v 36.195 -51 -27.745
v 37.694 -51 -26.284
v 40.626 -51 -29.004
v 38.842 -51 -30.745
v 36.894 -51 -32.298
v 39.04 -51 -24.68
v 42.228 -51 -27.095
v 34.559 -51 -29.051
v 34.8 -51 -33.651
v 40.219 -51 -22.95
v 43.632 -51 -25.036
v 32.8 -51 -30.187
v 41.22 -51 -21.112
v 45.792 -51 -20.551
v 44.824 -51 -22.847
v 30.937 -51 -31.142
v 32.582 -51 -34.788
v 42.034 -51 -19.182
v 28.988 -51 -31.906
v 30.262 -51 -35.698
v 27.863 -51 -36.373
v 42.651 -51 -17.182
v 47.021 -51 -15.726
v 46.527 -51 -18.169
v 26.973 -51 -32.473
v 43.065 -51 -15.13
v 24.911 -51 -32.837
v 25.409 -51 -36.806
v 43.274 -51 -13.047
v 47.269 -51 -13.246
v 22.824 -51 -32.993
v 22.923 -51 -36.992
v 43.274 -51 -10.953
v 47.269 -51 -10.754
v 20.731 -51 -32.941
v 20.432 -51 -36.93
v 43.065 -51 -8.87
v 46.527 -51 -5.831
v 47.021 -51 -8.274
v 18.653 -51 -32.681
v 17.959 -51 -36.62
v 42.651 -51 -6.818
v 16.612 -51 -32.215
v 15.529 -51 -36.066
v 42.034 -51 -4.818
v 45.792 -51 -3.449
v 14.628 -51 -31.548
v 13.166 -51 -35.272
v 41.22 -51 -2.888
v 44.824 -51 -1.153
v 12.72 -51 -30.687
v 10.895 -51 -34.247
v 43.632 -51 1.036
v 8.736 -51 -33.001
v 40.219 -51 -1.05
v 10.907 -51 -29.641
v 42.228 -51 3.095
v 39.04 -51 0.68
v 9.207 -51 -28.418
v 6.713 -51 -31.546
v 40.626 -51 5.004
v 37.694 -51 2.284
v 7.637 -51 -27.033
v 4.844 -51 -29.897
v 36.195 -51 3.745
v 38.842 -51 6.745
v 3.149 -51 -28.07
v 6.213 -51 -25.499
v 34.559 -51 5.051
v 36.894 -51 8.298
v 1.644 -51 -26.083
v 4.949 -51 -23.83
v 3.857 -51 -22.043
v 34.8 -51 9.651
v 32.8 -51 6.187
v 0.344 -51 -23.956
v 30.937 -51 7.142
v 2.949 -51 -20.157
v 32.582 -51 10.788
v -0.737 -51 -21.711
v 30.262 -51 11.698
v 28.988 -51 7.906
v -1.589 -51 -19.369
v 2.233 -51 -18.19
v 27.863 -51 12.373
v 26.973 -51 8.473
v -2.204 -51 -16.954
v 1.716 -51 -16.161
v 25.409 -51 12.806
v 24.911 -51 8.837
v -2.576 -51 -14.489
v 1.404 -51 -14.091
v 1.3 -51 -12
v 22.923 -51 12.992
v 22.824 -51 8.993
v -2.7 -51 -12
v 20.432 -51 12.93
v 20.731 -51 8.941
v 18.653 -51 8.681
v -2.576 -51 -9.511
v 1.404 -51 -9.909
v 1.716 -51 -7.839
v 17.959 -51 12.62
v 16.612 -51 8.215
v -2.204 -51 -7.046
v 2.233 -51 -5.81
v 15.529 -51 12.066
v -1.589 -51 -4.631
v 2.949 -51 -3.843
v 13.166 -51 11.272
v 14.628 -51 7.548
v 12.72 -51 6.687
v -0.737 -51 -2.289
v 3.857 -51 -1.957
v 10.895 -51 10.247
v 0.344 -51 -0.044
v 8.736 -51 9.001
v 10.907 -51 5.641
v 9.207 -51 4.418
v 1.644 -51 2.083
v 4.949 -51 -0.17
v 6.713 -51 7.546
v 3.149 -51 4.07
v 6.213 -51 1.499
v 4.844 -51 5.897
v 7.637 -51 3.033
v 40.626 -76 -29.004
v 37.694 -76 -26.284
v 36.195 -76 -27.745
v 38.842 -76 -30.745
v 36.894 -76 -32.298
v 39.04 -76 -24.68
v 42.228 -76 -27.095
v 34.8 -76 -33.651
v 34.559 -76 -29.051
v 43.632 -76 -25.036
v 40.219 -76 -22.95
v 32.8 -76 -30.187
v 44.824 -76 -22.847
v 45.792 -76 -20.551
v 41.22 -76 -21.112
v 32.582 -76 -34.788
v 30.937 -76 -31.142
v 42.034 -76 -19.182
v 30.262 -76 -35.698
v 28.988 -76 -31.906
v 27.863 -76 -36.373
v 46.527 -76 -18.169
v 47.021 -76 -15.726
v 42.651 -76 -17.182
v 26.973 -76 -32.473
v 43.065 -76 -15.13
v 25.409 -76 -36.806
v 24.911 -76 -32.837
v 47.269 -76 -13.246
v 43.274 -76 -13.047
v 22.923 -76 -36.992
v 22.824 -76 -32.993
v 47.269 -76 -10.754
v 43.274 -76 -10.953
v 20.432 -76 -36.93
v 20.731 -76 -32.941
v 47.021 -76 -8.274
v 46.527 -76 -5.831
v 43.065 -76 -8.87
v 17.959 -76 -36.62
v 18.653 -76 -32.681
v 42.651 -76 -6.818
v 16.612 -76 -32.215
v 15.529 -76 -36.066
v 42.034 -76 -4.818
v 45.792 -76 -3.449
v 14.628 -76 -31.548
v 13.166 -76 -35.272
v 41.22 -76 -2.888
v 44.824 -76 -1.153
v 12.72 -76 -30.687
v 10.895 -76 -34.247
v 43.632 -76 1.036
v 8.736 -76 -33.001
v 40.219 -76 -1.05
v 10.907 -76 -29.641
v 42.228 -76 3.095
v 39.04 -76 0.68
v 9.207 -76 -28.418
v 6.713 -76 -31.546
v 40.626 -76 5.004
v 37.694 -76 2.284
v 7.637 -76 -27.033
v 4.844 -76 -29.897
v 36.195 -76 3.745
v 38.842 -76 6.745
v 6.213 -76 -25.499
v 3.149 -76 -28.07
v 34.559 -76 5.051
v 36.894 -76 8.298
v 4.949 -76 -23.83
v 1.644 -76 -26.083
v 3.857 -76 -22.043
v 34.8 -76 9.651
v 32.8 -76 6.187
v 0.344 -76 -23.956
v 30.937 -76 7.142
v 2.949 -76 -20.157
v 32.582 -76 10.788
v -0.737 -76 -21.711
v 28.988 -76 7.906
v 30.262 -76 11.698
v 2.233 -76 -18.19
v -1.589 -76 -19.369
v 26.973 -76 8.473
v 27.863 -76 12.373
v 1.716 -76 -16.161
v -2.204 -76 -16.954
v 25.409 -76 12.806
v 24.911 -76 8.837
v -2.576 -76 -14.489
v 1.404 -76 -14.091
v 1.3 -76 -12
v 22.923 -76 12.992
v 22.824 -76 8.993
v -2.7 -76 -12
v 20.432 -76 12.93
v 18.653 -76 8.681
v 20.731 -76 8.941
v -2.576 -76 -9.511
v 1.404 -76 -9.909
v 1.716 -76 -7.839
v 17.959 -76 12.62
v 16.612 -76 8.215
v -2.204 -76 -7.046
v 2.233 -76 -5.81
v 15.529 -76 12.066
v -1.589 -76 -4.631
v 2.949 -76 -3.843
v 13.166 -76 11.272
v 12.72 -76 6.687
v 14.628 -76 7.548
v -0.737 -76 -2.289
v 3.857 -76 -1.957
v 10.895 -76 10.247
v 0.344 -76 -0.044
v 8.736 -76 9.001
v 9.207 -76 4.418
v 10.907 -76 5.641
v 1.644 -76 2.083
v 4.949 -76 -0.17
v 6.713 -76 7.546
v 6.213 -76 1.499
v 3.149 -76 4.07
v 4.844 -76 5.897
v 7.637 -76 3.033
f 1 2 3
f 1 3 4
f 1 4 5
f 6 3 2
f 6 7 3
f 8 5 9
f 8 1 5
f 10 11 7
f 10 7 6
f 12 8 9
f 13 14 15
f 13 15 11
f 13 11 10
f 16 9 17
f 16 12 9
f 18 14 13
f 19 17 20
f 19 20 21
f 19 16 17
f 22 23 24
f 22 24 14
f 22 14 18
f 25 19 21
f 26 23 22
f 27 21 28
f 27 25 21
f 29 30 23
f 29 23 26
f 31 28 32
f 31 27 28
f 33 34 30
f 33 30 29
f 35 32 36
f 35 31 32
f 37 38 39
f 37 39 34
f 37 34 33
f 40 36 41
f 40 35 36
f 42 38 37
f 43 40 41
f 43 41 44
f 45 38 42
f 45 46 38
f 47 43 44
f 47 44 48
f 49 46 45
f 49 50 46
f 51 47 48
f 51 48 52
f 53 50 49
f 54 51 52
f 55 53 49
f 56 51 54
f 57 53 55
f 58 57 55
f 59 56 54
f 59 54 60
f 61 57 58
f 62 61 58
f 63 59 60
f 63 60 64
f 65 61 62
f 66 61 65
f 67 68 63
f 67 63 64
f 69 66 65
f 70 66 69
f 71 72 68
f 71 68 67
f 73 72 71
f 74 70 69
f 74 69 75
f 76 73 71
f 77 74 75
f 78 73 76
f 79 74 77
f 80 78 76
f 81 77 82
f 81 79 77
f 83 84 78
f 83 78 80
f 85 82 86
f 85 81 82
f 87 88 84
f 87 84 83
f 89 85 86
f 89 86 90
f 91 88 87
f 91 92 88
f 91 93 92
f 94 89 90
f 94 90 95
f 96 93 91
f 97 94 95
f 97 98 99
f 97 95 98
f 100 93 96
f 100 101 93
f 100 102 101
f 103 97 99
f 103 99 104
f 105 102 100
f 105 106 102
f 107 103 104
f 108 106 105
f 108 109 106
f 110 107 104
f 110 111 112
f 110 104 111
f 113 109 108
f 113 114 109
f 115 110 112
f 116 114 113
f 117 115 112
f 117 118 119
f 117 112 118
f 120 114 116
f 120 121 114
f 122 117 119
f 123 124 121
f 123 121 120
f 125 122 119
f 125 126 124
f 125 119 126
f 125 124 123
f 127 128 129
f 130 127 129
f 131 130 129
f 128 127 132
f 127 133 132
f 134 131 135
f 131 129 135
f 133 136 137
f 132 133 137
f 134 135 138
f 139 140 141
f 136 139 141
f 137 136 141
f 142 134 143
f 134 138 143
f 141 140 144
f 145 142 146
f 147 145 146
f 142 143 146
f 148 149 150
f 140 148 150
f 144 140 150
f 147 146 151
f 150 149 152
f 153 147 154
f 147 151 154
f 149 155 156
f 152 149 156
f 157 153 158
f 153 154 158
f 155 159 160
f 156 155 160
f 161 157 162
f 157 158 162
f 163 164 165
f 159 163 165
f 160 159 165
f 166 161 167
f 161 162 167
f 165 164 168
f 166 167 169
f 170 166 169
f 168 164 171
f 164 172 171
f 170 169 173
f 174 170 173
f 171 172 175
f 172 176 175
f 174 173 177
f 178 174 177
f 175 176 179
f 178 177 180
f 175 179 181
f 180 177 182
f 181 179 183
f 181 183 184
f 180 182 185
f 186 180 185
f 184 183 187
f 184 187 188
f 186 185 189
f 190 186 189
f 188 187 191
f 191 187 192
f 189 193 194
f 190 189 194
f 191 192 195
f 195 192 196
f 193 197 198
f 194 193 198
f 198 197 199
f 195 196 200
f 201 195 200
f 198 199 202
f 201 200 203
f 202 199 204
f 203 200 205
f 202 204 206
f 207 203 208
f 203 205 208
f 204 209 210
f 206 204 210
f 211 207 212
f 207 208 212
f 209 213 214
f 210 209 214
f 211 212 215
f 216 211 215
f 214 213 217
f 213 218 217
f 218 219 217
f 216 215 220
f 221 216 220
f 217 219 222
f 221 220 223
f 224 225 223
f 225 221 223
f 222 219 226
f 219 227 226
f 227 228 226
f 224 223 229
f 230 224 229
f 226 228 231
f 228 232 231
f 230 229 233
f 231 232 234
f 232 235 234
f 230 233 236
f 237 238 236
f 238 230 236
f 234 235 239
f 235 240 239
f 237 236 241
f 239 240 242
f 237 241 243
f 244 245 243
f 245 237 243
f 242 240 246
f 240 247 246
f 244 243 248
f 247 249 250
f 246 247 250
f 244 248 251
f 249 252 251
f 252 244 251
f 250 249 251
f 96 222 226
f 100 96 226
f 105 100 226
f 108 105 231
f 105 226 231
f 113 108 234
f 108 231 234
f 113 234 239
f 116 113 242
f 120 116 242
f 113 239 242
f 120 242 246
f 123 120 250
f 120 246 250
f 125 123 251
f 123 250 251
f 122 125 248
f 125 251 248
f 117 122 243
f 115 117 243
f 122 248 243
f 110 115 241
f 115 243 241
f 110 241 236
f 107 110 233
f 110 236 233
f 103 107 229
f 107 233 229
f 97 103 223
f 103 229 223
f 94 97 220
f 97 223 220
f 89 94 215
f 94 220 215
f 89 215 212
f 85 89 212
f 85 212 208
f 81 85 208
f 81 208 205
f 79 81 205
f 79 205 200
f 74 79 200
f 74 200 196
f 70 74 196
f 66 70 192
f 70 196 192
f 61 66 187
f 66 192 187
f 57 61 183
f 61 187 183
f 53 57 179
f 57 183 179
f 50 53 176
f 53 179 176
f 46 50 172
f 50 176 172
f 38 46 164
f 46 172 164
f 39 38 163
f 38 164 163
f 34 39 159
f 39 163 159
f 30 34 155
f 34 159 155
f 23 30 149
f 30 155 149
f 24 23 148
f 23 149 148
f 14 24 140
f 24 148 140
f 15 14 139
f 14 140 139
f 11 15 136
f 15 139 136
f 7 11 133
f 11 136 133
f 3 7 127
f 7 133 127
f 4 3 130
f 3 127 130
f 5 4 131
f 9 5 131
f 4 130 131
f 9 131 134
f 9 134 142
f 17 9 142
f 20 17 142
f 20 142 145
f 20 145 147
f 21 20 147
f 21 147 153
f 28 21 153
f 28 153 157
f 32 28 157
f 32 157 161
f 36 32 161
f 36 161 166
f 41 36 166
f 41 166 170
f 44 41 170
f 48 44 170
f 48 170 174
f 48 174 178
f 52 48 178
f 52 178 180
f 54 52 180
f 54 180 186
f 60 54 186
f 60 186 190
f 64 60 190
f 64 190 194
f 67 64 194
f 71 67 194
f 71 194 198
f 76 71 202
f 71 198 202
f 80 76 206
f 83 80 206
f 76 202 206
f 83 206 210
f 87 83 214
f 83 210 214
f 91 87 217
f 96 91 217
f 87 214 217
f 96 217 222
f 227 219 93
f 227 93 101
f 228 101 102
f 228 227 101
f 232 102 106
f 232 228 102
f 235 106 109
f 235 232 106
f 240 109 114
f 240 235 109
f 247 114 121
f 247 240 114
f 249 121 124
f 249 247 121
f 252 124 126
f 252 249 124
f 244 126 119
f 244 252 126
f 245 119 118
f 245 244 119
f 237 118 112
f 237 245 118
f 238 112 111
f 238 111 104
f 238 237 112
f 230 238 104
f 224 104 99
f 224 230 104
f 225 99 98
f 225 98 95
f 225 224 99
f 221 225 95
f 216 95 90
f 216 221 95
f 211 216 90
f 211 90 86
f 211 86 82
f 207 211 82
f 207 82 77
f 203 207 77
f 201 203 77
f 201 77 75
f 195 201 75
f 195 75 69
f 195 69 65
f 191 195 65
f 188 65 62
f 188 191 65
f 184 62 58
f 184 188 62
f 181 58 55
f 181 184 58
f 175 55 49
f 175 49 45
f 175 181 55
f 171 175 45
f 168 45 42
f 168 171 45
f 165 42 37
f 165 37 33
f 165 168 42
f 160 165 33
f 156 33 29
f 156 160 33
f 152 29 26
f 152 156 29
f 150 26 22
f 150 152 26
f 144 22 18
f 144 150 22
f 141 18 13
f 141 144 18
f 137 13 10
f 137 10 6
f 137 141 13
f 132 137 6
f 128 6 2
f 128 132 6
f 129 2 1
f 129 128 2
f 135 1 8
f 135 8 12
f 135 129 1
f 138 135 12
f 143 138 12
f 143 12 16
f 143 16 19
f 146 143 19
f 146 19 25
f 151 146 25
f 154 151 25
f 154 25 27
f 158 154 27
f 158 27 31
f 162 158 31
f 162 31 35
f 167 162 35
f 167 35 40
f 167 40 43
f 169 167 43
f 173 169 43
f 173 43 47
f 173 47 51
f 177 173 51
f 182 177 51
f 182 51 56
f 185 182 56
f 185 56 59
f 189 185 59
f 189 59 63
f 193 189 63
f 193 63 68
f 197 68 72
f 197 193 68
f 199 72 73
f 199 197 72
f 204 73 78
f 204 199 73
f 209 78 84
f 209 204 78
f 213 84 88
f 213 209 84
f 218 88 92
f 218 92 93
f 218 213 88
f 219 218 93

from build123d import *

# Parameters (mm, degrees)
CYLINDER015_R          = 21
CYLINDER015_DEPTH      = 25
CYLINDER016_R          = 25
CYLINDER016_DEPTH      = 25
CUT004_ROLL_ANGLE      = 90
CUT004_PITCH_ANGLE     = -7e-06
CUT004_PLACEMENT_ANGLE = -179.999993


with BuildPart() as cylinder015:
    # Cylinder015 → Cylinder015 (new body)
    with BuildSketch(Plane.XY):
        Circle(CYLINDER015_R)
    extrude(amount=CYLINDER015_DEPTH)


with BuildPart() as cut004:
    # Cylinder016 → Cylinder016 (new body)
    with BuildSketch(Plane.XY):
        Circle(CYLINDER016_R)
    extrude(amount=CYLINDER016_DEPTH)

    # Cut004: cut Cylinder015
    add(cylinder015.part, mode=Mode.SUBTRACT)


with BuildPart() as cut004_1:
    # Cut004 roll: moved
    add(cut004.part.rotate(Axis((0, 0, 0), (1, 0, 0)), CUT004_ROLL_ANGLE))


with BuildPart() as cut004_2:
    # Cut004 pitch: moved
    add(cut004_1.part.rotate(Axis((0, 0, 0), (0, 1, 0)), CUT004_PITCH_ANGLE))


with BuildPart() as cut004_3:
    # Cut004 placement: moved
    add(cut004_2.part.moved(Location((22.3, -76, -12))).rotate(Axis((22.3, -76, -12), (0, 0, 1)), CUT004_PLACEMENT_ANGLE))


solid = cut004_3.part
